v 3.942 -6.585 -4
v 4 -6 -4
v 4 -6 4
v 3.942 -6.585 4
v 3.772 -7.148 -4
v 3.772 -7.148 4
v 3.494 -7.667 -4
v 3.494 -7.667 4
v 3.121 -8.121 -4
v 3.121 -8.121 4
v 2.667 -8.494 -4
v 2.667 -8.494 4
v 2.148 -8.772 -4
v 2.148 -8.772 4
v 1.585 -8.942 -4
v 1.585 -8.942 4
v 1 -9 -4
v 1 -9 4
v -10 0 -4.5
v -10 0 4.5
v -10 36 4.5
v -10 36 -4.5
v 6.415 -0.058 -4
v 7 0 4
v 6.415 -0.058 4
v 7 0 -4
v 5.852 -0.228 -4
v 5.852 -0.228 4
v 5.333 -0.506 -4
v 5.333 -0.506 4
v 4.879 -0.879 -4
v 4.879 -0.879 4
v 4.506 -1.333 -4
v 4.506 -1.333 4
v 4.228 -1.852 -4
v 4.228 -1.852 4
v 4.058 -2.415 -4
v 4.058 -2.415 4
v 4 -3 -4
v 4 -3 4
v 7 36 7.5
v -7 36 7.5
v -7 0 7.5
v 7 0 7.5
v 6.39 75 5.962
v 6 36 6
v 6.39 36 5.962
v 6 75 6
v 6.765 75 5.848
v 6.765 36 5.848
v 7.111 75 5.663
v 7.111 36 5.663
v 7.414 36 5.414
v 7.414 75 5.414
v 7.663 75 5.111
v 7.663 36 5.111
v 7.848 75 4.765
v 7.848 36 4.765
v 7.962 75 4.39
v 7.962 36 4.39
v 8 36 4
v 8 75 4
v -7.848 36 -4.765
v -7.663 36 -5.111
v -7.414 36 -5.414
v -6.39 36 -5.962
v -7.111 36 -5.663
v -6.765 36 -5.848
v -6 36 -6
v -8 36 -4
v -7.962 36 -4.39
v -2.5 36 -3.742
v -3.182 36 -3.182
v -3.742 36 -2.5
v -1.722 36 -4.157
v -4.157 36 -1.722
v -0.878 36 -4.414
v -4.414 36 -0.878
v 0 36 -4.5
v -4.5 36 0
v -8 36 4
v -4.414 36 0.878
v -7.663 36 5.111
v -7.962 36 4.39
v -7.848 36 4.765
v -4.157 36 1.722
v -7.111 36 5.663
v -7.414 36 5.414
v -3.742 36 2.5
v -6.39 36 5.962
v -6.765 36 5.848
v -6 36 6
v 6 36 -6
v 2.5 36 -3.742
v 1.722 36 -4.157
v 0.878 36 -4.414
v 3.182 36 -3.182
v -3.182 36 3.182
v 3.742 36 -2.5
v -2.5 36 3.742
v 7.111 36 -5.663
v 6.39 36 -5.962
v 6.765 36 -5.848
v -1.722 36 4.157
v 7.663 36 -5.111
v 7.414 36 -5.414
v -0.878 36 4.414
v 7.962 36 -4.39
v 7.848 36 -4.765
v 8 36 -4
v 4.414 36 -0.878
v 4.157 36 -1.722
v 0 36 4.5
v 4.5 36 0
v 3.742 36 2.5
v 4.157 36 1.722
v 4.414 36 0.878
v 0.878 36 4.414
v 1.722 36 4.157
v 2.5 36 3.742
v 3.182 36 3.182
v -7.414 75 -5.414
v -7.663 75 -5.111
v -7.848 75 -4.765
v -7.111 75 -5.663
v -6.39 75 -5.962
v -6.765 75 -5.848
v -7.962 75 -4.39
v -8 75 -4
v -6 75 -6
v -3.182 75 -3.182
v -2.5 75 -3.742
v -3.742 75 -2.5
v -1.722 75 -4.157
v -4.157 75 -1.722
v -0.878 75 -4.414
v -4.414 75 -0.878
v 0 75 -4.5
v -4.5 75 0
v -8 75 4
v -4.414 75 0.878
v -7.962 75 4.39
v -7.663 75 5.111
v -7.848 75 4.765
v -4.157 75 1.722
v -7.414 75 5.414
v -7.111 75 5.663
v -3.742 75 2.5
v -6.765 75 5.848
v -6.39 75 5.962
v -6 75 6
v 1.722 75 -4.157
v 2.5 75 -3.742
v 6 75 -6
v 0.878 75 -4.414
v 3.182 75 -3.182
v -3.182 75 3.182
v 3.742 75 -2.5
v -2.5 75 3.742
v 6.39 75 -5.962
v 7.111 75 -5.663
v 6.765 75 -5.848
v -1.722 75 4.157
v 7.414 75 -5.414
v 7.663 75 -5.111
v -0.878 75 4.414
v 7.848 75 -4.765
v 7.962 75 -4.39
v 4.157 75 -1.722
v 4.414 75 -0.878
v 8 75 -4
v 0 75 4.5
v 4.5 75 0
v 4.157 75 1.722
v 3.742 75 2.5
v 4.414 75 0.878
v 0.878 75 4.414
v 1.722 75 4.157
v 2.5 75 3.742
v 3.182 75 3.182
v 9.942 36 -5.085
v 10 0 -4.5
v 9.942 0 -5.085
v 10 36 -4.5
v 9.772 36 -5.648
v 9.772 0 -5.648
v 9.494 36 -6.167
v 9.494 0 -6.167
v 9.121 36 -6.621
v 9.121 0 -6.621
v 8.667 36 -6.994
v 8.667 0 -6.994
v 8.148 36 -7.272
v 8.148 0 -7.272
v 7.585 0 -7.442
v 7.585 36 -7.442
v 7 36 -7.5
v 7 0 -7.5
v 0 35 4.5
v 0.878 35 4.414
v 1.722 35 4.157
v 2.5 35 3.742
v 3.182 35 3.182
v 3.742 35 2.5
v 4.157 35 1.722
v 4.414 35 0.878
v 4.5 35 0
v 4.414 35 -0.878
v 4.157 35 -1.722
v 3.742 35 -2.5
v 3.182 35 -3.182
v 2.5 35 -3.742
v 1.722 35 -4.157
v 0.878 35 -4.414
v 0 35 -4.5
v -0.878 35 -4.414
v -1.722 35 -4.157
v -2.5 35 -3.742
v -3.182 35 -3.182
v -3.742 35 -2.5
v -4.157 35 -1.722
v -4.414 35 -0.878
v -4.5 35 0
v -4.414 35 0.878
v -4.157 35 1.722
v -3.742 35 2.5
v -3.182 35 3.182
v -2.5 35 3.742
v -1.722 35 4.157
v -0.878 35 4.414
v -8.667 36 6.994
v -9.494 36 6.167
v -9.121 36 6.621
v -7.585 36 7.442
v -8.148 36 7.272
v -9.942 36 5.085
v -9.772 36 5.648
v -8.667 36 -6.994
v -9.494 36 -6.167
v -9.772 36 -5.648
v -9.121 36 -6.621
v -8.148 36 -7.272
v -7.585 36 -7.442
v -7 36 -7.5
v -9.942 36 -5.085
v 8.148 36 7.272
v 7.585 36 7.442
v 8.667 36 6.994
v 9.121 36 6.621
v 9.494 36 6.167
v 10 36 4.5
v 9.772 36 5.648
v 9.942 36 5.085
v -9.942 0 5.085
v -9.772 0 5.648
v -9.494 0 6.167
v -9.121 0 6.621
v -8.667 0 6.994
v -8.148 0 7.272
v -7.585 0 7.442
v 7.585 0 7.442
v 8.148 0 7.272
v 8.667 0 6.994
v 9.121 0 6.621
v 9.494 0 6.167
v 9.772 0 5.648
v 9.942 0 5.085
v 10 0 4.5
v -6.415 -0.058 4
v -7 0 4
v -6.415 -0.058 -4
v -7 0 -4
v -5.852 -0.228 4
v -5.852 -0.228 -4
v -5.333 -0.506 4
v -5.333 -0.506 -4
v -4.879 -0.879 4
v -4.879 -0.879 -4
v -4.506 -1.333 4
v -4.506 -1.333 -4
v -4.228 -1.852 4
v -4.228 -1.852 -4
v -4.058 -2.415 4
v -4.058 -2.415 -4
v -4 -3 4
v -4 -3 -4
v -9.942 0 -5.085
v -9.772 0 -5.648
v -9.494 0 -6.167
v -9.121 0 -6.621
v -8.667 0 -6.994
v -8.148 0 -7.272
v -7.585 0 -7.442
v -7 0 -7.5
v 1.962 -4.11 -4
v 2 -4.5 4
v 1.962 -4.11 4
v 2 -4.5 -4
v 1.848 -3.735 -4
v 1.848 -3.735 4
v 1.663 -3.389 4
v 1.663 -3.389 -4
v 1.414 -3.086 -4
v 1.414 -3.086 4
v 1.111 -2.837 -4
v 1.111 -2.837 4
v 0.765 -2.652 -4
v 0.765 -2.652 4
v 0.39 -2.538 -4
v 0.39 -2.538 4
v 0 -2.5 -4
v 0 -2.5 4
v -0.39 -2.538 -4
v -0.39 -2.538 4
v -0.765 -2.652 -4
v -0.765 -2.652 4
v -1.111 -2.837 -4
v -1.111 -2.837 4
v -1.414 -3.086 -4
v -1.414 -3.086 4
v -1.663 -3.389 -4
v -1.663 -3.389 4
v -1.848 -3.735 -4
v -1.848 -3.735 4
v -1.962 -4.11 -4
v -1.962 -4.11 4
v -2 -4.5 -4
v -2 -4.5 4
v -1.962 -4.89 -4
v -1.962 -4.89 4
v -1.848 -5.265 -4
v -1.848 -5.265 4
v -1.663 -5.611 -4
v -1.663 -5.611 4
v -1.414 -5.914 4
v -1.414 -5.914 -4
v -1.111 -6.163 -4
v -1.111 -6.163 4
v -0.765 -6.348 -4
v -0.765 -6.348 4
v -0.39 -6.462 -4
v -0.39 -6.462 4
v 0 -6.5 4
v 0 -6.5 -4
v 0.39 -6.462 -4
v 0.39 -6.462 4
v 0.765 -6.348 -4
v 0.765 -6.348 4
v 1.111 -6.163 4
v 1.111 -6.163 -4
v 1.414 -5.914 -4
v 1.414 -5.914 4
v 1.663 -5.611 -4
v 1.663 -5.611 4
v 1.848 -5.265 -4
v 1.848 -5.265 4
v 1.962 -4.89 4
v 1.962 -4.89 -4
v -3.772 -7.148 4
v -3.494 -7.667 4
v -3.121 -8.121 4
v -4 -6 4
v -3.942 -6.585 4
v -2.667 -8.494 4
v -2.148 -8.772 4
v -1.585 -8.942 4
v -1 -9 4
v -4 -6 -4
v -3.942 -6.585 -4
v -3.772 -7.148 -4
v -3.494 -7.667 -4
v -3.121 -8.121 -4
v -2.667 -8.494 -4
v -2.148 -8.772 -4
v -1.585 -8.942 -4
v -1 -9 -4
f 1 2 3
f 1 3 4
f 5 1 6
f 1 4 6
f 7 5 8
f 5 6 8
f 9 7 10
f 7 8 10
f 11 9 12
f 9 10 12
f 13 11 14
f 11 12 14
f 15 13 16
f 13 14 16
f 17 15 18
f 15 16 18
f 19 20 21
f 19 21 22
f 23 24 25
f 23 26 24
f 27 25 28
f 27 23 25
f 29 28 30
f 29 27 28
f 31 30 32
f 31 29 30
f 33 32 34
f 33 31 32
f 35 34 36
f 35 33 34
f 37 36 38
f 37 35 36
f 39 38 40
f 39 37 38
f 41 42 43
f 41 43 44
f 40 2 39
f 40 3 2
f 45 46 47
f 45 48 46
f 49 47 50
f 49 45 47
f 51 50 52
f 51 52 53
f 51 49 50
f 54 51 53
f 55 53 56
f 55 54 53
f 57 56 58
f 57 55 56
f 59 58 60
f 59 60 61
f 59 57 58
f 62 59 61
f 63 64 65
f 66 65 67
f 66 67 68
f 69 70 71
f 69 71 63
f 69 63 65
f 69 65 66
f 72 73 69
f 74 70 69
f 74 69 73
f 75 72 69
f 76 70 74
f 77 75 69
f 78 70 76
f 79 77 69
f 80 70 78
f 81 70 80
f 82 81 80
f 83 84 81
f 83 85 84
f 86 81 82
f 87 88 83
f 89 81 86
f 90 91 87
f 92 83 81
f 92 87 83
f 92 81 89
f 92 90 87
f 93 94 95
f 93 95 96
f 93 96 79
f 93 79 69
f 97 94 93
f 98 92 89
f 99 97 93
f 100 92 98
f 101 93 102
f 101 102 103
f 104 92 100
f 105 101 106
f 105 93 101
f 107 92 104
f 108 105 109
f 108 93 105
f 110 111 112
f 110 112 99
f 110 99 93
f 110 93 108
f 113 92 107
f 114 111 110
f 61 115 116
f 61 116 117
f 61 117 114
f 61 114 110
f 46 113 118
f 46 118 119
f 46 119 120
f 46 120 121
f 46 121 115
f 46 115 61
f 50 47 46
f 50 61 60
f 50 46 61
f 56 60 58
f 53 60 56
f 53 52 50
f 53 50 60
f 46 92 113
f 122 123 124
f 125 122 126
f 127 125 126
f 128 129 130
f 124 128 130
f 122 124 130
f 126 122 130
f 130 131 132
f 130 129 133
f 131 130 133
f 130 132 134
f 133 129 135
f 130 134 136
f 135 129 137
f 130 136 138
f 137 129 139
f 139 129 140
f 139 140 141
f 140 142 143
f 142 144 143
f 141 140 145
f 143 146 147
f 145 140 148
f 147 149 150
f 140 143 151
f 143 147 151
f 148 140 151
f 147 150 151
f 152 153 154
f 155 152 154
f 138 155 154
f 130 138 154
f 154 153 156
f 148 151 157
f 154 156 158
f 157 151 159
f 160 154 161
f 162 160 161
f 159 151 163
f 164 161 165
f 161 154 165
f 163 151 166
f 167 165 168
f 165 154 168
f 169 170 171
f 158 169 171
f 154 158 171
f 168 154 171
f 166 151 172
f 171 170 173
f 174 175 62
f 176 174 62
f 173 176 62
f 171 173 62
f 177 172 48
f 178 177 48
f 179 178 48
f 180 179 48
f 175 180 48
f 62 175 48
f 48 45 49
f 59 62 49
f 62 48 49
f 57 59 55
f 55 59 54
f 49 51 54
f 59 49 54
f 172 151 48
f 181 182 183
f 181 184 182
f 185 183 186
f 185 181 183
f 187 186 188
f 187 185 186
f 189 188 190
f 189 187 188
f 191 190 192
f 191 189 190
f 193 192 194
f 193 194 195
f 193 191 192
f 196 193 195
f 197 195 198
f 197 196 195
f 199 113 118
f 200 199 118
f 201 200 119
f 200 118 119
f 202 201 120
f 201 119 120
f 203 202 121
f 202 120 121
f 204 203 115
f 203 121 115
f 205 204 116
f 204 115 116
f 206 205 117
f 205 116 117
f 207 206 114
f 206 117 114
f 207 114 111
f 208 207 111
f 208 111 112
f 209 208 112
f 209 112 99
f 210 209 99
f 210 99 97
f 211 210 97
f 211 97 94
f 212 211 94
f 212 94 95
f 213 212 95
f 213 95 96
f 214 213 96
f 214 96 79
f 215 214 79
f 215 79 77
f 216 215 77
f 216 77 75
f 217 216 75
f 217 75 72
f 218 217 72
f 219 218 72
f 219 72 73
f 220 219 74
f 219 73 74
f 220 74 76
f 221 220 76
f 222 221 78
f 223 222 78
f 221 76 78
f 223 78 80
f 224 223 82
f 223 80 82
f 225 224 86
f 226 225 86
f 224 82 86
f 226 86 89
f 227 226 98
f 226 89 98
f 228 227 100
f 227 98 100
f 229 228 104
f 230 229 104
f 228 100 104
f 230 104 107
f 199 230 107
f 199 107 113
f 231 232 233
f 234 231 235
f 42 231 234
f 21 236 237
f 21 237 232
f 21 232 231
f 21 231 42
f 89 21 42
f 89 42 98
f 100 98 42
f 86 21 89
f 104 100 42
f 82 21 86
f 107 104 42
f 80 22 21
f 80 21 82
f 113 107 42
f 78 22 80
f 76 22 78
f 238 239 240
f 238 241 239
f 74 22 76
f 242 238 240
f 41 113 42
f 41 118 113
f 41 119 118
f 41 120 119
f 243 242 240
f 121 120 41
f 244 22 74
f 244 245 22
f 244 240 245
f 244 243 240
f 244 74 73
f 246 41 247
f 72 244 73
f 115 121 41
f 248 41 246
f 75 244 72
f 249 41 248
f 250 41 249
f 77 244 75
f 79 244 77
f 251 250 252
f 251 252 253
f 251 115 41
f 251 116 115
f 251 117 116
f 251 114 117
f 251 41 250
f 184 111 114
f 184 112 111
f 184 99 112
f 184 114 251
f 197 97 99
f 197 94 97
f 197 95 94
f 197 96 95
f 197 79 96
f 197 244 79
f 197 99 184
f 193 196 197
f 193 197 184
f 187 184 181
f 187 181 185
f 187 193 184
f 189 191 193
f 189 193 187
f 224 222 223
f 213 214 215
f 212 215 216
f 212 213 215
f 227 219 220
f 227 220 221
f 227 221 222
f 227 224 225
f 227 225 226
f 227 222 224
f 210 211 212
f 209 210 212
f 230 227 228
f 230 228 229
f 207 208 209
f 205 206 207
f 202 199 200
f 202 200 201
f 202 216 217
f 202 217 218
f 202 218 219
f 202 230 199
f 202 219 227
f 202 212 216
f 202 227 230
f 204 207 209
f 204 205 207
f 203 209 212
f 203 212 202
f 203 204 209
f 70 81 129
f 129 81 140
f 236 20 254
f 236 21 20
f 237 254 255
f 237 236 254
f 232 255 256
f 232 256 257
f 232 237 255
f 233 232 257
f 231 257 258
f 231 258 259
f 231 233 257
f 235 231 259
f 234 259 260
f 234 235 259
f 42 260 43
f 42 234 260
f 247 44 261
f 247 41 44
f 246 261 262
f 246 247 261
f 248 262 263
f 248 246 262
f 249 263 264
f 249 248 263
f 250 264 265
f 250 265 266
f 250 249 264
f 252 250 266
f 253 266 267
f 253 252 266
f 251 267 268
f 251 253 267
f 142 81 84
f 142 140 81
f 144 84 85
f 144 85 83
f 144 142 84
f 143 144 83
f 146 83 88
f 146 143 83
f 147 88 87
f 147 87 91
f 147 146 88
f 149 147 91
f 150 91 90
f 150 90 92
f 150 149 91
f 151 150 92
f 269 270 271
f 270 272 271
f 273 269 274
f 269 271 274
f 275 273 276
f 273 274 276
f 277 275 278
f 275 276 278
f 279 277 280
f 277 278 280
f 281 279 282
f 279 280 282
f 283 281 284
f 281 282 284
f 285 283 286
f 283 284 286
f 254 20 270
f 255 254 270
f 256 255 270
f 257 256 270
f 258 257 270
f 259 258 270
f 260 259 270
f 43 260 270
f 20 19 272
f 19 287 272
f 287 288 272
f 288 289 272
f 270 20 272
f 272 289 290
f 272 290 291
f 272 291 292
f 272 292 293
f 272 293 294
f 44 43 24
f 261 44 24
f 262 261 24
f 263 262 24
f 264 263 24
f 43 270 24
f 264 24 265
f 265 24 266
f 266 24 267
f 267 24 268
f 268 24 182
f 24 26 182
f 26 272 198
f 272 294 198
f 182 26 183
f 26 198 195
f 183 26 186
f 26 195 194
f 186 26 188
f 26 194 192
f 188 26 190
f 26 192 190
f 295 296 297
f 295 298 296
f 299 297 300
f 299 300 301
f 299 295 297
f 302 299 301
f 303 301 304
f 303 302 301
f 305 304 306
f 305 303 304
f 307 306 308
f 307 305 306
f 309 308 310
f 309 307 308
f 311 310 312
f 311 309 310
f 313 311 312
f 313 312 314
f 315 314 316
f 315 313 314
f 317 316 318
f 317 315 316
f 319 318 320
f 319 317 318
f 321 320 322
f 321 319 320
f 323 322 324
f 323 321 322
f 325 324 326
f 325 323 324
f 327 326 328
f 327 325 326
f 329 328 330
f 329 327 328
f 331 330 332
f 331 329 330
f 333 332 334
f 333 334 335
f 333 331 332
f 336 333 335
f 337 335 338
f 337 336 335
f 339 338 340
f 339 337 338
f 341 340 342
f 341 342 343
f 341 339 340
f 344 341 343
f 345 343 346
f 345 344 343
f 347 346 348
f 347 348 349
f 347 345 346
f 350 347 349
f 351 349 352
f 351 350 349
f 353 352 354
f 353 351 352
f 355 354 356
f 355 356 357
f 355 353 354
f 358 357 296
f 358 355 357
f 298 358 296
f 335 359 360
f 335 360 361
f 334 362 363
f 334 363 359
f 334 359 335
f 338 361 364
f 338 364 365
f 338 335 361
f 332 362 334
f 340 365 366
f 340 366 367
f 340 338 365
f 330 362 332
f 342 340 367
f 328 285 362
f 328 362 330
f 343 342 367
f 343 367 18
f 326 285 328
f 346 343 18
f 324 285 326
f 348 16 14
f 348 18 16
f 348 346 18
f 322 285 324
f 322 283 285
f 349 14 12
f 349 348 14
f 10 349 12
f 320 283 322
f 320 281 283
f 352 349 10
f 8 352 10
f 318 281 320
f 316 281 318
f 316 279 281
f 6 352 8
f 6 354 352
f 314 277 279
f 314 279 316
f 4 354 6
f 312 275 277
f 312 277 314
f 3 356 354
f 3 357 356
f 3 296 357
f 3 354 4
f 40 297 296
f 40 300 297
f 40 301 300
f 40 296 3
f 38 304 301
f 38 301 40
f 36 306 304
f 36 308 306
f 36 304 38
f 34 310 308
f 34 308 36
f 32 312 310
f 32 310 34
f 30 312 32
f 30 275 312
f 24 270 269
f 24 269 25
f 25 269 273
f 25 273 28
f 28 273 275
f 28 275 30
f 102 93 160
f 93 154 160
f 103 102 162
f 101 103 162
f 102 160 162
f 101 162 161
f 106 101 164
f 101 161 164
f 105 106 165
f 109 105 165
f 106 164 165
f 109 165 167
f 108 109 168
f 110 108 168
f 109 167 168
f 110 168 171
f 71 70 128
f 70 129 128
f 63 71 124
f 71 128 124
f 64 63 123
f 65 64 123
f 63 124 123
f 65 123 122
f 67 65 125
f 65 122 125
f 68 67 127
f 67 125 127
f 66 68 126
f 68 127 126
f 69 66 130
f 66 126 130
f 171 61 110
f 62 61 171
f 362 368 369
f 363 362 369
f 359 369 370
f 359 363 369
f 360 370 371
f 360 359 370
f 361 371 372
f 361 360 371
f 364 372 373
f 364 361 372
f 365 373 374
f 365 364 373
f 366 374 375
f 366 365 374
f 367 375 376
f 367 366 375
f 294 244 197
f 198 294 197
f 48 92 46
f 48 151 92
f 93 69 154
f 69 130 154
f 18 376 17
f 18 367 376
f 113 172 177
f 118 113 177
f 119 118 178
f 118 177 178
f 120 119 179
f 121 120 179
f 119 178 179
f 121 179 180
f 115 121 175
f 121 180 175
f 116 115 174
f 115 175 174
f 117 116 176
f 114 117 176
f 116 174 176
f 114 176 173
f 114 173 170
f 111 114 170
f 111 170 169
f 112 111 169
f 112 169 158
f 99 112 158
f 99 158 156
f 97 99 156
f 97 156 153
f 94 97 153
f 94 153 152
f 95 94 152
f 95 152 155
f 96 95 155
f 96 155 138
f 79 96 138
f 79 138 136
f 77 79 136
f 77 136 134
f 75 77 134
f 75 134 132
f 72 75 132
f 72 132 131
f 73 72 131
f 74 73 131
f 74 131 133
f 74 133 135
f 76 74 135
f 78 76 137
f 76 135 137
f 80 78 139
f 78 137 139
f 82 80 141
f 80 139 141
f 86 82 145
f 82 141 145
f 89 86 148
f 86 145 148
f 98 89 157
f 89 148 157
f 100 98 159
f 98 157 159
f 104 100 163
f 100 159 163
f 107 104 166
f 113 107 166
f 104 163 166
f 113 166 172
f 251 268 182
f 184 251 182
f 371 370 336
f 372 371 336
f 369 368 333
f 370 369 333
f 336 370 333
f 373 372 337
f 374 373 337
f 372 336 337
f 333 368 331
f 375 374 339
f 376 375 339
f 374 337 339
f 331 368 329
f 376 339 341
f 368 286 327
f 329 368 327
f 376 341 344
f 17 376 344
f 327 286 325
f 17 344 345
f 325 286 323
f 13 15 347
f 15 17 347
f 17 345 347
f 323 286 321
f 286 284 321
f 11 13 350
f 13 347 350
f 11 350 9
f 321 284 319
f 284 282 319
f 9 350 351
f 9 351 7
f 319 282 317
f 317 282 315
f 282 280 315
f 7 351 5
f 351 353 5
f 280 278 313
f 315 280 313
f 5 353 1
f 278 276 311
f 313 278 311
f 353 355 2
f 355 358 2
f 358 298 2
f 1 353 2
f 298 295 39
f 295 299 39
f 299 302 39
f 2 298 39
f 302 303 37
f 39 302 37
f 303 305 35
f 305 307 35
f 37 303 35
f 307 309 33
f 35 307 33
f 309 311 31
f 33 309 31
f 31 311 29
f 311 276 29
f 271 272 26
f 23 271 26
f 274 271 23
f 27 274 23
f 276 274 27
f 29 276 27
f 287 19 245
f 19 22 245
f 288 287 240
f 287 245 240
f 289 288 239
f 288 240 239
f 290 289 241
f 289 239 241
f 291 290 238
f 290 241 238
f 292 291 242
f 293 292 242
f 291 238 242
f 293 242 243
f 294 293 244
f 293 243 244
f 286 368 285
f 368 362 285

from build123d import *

# Parameters (mm, degrees)
SKETCH_1_W          = 20
SKETCH_1_H          = 15
EXTRUDE_1_DEPTH     = 36
SKETCH_2_W          = 8
SKETCH_2_H          = 9
SKETCH_2_R          = 2
EXTRUDE_2_DEPTH     = 4
FILLET_1_R          = 3
SKETCH_3_W          = 16
SKETCH_3_H          = 39
EXTRUDE_3_DEPTH     = 6
SKETCH_4_R          = 4.5
CUT_EXTRUDE_1_DEPTH = 40
FILLET_2_R          = 3
FILLET_3_R          = 2


with BuildPart() as part:
    # 草图1 → 凸台-拉伸1 (new body)
    with BuildSketch(Plane(origin=(0, 0, 0), x_dir=(1, 0, 0), z_dir=(0, 1, 0))):
        Rectangle(SKETCH_1_W, SKETCH_1_H)
    extrude(amount=EXTRUDE_1_DEPTH)

    # 草图2 → 凸台-拉伸2 (add, symmetric)
    with BuildSketch(Plane.XY):
        with Locations((0, -4.5)):
            Rectangle(SKETCH_2_W, SKETCH_2_H)
        with Locations((0, -4.5)):
            Circle(SKETCH_2_R, mode=Mode.SUBTRACT)
    extrude(amount=EXTRUDE_2_DEPTH, both=True)

    # 圆角1
    fillet_1_edges = [part.edges().sort_by_distance(p)[0] for p in [
        (4, 0, 0),
        (-4, 0, 0),
        (-4, -9, 0),
        (4, -9, 0),
    ]]
    fillet(fillet_1_edges, radius=FILLET_1_R)


with BuildPart() as body_2:
    # 草图3 → 凸台-拉伸3 (new, symmetric)
    with BuildSketch(Plane.XY):
        with Locations((0, 55.5)):
            Rectangle(SKETCH_3_W, SKETCH_3_H)
    extrude(amount=EXTRUDE_3_DEPTH, both=True)


with BuildPart() as cut_extrude_1_tool:
    # 草图4 → 切除-拉伸1 (new body)
    with BuildSketch(Plane(origin=(0, 75, 0), x_dir=(1, 0, 0), z_dir=(0, 1, 0))):
        with Locations(Location((0, 0, 0), (0, 0, 270))):
            Circle(SKETCH_4_R)
    extrude(amount=-CUT_EXTRUDE_1_DEPTH)


with BuildPart() as part_1:
    add(part.part)

    # 切除-拉伸1: cut by cut_extrude_1_tool
    add(cut_extrude_1_tool.part, mode=Mode.SUBTRACT)

    # 圆角2
    fillet_2_edges = [part_1.edges().sort_by_distance(p)[0] for p in [
        (10, 18, 7.5),
        (-10, 18, 7.5),
        (-10, 18, -7.5),
        (10, 18, -7.5),
    ]]
    fillet(fillet_2_edges, radius=FILLET_2_R)


with BuildPart() as body_2_1:
    add(body_2.part)

    # 切除-拉伸1: cut by cut_extrude_1_tool
    add(cut_extrude_1_tool.part, mode=Mode.SUBTRACT)

    # 圆角3
    fillet_3_edges = [body_2_1.edges().sort_by_distance(p)[0] for p in [
        (-8, 55.5, 6),
        (8, 55.5, 6),
        (-8, 55.5, -6),
        (8, 55.5, -6),
    ]]
    fillet(fillet_3_edges, radius=FILLET_3_R)


solid = Compound([part_1.part, body_2_1.part])
